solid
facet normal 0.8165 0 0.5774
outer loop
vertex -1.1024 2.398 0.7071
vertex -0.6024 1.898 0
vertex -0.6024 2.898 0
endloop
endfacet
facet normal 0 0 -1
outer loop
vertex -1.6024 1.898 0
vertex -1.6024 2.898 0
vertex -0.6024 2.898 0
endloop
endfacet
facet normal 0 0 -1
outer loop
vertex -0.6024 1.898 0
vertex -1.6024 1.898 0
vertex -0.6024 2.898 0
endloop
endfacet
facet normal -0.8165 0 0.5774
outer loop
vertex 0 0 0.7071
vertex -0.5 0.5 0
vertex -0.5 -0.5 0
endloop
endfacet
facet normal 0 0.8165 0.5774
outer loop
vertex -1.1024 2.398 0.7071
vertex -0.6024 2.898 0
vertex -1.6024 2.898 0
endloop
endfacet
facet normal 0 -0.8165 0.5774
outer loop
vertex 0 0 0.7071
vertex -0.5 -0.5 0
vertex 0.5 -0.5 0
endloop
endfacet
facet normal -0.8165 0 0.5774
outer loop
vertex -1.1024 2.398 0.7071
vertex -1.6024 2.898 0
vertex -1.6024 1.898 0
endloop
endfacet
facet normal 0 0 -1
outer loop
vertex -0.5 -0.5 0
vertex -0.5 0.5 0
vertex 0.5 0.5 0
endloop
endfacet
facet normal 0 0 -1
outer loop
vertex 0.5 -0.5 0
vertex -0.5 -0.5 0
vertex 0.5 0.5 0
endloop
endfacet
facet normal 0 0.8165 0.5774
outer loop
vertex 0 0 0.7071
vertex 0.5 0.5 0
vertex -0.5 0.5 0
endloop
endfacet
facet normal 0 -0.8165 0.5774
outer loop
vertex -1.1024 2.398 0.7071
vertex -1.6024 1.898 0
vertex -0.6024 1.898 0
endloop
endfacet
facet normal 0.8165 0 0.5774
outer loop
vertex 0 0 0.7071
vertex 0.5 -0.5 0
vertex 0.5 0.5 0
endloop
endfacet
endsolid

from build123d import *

# Parameters (mm, degrees)
F0_W = 1
F0_H = 1
F7_W = 1
F7_H = 1


with BuildPart() as f6:
    # F0 (on Top) → F6 section 0
    with BuildSketch(Plane.XY, mode=Mode.PRIVATE) as f6_s0:
        Rectangle(F0_W, F0_H)
    loft([f6_s0.sketch, Vertex(0, 0, 0.7071067812)])


with BuildPart() as f10:
    # F7 (on Top) → F10 section 0
    with BuildSketch(Plane.XY, mode=Mode.PRIVATE) as f10_s0:
        with Locations((-1.1024075793, 2.3979991106)):
            Rectangle(F7_W, F7_H)
    loft([f10_s0.sketch, Vertex(-1.1024075793, 2.3979991106, 0.7071067812)])


solid = Compound([f6.part, f10.part])
